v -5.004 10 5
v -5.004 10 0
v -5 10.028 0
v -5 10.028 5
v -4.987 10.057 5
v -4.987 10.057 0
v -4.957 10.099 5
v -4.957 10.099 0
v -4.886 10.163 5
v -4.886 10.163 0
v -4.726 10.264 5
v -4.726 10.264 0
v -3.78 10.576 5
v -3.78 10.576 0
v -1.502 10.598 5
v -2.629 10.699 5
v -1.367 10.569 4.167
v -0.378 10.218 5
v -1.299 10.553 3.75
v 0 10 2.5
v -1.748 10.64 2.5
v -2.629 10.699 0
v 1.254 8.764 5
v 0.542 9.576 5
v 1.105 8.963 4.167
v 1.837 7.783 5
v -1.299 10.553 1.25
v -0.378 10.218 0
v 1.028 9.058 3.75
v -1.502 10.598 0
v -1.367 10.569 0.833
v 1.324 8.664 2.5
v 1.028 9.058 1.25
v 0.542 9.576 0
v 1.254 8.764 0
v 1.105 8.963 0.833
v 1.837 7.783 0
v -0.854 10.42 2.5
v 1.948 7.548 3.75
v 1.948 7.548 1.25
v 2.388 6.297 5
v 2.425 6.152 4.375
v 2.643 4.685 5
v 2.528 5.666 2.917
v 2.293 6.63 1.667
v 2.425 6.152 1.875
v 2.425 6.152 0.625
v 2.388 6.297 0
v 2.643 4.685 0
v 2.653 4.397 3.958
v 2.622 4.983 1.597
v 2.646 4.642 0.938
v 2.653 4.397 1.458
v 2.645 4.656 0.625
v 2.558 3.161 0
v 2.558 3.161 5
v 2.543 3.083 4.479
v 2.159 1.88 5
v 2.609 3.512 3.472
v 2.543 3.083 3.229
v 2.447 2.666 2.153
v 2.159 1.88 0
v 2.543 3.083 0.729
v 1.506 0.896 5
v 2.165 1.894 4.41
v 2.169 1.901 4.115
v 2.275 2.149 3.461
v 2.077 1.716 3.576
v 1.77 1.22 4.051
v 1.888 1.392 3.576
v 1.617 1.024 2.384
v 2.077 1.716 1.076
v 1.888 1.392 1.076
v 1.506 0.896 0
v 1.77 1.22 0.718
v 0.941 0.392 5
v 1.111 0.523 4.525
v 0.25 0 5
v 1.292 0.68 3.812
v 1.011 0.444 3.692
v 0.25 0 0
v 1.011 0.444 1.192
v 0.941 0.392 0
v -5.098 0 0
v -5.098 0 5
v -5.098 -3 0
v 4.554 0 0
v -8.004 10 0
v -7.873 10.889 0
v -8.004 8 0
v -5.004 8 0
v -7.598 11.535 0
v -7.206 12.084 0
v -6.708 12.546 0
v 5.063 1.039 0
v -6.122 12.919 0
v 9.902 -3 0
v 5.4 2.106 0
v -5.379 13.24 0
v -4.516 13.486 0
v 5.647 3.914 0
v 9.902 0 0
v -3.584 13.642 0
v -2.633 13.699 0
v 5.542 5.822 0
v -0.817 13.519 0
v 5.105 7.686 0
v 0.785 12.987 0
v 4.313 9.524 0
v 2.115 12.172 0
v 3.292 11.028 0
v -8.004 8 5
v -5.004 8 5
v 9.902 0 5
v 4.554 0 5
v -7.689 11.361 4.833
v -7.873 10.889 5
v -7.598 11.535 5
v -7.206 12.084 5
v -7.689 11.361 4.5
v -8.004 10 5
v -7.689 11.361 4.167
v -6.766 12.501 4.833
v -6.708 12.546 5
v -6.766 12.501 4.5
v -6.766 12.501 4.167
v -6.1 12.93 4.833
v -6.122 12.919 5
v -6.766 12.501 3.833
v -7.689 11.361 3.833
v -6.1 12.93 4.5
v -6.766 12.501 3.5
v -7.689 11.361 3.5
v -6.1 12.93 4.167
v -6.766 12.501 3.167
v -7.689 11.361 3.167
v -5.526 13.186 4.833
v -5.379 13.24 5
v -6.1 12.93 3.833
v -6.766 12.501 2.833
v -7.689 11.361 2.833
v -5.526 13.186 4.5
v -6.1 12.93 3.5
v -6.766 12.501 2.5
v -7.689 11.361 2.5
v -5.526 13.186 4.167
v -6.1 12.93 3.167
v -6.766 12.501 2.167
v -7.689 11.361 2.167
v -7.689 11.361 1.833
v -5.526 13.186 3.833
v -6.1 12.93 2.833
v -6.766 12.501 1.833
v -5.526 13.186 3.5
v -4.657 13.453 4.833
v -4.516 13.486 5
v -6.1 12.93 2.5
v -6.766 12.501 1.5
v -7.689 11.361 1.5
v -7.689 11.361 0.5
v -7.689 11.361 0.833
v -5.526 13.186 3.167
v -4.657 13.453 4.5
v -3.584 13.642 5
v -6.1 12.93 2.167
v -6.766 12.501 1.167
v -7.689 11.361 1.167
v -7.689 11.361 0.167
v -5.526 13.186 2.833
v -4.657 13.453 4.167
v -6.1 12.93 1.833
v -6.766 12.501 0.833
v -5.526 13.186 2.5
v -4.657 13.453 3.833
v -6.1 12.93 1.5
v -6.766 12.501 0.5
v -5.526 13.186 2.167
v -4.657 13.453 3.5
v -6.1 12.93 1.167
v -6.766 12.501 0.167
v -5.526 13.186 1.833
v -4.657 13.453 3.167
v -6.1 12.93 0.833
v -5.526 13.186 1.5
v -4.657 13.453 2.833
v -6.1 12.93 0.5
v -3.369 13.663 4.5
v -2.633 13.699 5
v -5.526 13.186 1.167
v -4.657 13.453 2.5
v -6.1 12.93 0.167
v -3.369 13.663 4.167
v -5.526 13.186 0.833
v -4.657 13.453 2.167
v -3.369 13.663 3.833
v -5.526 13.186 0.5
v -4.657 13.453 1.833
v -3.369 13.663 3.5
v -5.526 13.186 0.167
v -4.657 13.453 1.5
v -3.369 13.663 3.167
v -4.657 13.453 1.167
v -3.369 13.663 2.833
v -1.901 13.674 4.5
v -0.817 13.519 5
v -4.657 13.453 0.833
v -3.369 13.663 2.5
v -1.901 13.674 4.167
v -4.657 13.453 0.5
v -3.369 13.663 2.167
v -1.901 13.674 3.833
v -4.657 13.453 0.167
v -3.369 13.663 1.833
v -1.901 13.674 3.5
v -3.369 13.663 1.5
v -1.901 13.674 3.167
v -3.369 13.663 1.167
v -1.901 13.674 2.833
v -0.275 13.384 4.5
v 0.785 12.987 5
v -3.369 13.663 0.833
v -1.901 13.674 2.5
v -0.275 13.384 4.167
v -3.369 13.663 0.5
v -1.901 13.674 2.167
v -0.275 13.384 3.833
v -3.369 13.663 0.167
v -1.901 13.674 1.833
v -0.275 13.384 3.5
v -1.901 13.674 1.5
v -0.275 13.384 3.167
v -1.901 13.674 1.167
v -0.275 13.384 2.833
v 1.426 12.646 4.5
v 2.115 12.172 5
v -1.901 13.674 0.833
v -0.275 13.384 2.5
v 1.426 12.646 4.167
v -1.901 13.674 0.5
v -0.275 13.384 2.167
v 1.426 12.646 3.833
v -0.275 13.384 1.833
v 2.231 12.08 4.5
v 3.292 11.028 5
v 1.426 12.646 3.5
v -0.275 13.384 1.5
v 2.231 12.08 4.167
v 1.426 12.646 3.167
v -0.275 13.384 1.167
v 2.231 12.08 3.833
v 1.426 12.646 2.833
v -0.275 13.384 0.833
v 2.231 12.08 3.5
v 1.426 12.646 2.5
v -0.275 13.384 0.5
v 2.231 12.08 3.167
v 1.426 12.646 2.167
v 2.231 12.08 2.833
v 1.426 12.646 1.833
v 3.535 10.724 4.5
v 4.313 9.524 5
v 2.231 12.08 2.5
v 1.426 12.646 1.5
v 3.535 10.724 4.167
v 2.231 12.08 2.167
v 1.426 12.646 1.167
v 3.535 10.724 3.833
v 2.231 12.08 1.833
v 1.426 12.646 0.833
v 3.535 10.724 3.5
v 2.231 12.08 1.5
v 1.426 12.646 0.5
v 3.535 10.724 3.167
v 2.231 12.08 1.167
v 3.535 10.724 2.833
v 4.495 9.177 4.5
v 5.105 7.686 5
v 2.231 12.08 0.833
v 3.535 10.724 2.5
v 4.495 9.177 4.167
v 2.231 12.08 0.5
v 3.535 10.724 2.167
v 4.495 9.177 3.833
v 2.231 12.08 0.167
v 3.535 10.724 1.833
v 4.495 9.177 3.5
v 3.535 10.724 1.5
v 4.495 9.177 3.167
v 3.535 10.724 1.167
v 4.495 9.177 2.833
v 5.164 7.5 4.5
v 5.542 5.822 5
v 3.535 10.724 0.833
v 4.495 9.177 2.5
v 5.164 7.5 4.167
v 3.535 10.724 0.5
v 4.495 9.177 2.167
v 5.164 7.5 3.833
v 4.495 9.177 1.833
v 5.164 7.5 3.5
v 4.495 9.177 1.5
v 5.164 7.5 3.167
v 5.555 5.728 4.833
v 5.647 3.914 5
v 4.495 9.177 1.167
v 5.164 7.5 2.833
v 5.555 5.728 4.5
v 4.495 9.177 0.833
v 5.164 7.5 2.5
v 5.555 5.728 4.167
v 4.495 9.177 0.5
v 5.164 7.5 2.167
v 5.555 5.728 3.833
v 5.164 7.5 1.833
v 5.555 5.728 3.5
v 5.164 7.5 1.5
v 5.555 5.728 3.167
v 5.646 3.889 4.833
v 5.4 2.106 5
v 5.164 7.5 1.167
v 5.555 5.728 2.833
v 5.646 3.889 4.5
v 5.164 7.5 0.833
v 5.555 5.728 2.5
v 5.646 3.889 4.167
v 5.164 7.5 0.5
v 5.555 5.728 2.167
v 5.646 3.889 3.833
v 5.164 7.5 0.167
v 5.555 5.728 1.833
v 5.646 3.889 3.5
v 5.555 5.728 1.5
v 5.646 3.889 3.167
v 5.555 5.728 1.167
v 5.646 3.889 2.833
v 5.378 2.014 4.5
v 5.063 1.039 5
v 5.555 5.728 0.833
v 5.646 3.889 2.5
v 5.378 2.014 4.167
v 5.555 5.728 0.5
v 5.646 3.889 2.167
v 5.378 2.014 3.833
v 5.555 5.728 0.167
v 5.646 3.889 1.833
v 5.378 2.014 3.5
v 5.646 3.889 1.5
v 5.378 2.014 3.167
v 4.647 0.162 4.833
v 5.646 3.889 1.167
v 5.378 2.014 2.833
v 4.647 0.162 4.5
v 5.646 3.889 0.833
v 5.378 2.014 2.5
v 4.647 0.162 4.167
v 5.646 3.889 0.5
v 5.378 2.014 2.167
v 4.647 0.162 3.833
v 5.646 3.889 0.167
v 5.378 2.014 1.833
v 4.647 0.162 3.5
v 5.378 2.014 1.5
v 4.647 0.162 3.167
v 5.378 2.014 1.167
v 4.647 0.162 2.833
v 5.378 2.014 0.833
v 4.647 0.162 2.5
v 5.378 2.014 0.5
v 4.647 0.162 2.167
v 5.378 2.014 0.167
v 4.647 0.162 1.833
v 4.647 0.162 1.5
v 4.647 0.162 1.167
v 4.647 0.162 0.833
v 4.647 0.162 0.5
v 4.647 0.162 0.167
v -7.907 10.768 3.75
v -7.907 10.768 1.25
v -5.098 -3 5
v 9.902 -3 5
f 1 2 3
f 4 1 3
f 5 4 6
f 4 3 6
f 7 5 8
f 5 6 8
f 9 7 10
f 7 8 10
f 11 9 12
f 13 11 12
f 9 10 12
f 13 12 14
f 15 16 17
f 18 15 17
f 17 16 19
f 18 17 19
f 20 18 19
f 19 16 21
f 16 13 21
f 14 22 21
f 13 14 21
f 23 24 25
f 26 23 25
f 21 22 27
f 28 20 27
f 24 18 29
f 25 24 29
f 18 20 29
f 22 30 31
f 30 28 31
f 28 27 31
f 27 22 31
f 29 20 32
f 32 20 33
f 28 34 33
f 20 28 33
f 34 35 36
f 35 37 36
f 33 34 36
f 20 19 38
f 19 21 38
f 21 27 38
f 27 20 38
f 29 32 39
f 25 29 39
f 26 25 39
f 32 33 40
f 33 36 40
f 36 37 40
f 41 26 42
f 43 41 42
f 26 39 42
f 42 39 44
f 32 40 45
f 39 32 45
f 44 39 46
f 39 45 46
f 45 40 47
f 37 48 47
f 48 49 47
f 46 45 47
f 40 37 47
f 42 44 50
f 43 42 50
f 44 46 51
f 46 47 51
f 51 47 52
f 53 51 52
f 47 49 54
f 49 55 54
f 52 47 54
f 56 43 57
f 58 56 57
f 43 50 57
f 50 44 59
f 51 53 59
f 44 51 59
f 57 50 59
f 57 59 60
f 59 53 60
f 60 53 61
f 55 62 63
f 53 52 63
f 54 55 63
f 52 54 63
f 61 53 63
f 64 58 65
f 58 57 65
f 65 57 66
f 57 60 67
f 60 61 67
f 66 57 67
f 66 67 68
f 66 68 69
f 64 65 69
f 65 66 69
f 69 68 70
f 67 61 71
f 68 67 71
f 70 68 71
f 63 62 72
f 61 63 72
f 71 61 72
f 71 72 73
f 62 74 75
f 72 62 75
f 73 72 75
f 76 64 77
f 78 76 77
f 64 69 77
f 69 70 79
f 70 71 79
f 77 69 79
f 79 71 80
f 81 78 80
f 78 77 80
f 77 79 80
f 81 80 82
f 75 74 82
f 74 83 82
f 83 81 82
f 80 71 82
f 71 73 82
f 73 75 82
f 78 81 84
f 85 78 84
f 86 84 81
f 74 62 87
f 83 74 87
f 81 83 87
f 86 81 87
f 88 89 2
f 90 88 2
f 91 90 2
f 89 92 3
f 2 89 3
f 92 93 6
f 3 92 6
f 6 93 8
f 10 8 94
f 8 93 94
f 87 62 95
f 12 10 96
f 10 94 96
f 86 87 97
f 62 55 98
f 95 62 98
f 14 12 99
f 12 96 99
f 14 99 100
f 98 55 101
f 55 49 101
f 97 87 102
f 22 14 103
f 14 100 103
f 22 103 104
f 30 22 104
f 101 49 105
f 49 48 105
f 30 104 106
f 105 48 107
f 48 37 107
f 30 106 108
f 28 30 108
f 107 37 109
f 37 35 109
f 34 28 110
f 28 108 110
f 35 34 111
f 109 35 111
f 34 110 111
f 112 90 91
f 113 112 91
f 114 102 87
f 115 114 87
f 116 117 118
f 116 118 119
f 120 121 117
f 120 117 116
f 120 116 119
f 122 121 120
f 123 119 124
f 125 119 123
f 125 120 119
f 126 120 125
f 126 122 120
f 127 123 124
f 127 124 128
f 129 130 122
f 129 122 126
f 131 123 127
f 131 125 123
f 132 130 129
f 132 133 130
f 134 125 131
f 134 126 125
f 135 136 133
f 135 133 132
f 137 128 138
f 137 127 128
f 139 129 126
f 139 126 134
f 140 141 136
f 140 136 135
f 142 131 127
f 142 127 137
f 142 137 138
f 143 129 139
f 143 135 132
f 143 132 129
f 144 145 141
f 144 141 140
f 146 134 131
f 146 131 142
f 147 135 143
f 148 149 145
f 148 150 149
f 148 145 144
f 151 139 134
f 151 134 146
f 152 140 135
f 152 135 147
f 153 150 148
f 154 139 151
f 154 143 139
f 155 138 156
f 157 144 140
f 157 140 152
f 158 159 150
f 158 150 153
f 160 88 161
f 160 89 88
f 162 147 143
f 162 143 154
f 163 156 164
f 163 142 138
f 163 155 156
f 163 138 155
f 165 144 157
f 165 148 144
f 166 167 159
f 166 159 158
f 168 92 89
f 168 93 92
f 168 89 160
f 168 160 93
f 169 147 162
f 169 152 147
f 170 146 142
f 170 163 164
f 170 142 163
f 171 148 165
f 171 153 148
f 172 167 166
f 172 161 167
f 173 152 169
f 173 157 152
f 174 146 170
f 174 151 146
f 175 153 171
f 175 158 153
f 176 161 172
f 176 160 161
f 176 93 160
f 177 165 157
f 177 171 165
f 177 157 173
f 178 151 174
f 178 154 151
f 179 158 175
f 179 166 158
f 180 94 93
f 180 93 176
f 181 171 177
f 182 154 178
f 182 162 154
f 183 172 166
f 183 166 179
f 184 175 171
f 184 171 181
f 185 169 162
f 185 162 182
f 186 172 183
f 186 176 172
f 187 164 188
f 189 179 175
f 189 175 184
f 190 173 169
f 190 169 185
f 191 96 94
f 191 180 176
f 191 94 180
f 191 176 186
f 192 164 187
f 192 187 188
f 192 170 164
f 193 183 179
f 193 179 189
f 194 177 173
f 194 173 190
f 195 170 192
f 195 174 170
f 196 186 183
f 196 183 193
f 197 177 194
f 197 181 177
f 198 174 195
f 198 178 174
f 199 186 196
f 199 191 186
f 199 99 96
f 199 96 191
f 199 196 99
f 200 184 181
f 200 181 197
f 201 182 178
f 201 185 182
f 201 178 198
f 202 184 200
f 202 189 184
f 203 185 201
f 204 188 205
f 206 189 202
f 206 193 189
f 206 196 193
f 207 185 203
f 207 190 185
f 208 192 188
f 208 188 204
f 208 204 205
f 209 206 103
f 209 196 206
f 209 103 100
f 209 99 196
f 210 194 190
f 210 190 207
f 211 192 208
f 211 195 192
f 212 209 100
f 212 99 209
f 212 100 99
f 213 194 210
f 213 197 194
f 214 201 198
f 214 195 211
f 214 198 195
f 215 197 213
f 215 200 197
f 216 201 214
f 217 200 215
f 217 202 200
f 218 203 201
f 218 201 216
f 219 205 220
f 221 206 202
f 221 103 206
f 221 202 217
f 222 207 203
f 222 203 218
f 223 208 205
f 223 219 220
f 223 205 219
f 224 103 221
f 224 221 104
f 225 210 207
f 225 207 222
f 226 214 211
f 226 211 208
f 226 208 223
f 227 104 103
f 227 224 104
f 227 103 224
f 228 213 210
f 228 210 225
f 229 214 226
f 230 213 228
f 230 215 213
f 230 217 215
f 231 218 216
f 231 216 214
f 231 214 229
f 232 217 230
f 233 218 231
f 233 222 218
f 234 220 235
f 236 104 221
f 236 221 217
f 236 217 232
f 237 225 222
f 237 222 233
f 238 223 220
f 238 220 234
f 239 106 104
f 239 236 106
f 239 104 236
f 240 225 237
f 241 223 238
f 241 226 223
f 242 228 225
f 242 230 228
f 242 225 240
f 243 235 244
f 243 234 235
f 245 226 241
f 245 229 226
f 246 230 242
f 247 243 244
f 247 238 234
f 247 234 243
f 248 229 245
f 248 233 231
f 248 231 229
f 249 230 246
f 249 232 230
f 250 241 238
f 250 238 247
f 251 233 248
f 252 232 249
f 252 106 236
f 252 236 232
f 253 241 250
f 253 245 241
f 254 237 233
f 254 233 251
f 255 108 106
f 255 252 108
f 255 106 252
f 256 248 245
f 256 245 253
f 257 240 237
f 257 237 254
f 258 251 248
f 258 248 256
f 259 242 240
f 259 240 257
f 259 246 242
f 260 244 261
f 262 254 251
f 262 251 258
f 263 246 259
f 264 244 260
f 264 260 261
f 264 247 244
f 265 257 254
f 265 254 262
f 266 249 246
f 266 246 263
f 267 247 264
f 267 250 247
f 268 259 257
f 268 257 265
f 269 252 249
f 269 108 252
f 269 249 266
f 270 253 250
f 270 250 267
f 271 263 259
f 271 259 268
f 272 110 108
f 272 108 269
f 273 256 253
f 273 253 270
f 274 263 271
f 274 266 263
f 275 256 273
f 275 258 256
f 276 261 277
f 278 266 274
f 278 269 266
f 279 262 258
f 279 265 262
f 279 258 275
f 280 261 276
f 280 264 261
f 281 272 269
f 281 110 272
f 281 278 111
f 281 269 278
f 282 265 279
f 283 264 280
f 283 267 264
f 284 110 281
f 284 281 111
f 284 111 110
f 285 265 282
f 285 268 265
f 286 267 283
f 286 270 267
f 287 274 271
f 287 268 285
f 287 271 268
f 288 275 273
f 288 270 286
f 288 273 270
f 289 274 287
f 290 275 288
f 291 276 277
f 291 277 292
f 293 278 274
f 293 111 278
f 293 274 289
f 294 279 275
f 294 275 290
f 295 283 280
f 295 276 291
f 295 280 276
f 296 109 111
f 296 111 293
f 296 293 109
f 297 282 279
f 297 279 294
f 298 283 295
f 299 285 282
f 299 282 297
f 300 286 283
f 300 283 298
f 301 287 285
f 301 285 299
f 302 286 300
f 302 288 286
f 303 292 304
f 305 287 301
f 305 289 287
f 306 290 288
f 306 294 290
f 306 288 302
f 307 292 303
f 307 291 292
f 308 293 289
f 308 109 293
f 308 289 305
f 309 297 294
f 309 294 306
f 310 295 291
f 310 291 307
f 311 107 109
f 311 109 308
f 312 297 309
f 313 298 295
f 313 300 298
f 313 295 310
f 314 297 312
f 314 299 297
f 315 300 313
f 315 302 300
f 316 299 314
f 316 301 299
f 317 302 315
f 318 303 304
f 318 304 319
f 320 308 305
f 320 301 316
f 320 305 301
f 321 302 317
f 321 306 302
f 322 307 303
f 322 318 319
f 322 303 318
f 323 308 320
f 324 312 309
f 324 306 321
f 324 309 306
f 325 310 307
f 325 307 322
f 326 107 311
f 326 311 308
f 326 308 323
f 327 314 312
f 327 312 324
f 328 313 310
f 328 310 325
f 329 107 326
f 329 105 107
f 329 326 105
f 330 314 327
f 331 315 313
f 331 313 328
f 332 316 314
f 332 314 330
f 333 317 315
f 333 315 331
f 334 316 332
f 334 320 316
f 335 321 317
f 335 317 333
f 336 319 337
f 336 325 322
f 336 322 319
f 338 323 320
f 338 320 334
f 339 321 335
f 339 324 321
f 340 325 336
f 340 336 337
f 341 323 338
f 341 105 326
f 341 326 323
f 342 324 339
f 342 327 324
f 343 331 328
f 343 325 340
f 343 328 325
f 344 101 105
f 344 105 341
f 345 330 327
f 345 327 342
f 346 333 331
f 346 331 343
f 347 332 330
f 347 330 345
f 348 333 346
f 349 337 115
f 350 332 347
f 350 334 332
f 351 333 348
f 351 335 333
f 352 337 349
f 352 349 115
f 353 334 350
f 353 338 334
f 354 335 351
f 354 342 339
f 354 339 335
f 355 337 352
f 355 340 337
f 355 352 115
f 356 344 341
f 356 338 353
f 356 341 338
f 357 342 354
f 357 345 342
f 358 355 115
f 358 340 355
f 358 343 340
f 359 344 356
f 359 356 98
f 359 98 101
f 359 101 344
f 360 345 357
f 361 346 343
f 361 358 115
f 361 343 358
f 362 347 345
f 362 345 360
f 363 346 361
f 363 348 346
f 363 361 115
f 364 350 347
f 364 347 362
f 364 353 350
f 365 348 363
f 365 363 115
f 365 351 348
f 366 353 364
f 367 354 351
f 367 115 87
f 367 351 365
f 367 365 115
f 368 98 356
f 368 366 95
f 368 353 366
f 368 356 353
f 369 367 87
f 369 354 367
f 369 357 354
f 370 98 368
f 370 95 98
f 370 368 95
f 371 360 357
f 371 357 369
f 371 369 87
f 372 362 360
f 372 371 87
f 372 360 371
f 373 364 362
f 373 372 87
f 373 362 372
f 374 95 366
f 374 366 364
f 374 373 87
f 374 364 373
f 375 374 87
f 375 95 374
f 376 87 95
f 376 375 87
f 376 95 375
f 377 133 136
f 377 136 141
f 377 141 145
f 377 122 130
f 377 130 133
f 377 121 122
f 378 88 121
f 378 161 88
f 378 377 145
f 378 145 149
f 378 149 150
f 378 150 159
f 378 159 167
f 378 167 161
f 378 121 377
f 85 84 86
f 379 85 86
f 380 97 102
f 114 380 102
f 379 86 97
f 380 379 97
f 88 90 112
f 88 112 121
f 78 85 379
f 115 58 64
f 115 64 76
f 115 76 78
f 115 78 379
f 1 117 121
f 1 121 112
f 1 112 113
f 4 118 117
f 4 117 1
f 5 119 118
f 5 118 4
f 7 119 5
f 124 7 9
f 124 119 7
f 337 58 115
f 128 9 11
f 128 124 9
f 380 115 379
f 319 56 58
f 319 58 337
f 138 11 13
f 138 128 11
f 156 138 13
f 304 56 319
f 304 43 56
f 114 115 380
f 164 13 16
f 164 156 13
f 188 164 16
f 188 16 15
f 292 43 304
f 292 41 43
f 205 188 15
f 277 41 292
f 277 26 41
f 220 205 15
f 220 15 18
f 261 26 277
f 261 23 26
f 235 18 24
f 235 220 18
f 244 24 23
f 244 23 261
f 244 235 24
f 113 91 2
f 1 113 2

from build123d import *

# Parameters (mm, degrees)
F0_W     = 3
F0_H     = 2
F1_DEPTH = 5


# Not quite as in the source:
# - ends of sketch curves that miss each other by under 0.0002 mm in the source are joined
# - the dataset's text gives a spline's control points without its knots; the knots are read off the source's solid


with BuildPart() as f1:
    # F0 (on Top) → F1 (new body)
    with BuildSketch(Plane.XY):
        Polygon((0.2503667564, 0), (-5.0978784384, 0), (-5.0978784384, -3), (9.9021215616, -3), (9.9021215616, 0), (4.5538399041, 0), align=None)
        with BuildLine():
            add(Edge.make_bspline(
                [(-5.0038373292, 10), (-5.0038373292, 10.4105466628), (2.1157200772, 12.6615455049), (4.0203314378, 1.6529998477), (0.2503667564, 0)],
                knots=[0, 0, 0, 0, 0.4142686249, 1, 1, 1, 1], degree=3))
            Line((0.2503667564, 0), (4.5538399041, 0))
            add(Edge.make_bspline(
                [(-8.0038373298, 10), (-8.0038373298, 10.2787056237), (-7.9265937296, 10.7996899682), (-7.6932242014, 11.3893049019), (-7.4344399504, 11.8107970085), (-7.1058635967, 12.2133413532), (-6.7538412088, 12.5232161476), (-6.4054617225, 12.7628325838), (-6.0969380756, 12.93621453), (-5.8079542421, 13.0736567268), (-5.5258027553, 13.1889045793), (-5.1488196574, 13.3220823158), (-4.6640252083, 13.4592847565), (-4.0426527359, 13.5858120578), (-3.3762627135, 13.6713518347), (-2.6639349861, 13.7084653959), (-1.9073543006, 13.686135431), (-1.1101715023, 13.5900533961), (-0.2790603331, 13.4026671913), (0.5747150123, 13.1031110257), (1.2876198097, 12.743572644), (1.8463165534, 12.3791285027), (2.3650523455, 11.9843299327), (2.9469957376, 11.4415186656), (3.7495742807, 10.4950924187), (4.5420905535, 9.1980589469), (5.209598751, 7.5151054912), (5.6041511953, 5.7386647539), (5.7043043683, 3.8960335815), (5.4539395397, 2.0134312582), (4.9603909881, 0.7054202789), (4.5856072864, 0.0536222336), (4.5538399041, 0)],
                knots=[0, 0, 0, 0, 0.0078125, 0.015625, 0.0234375, 0.03125, 0.046875, 0.0625, 0.078125, 0.09375, 0.109375, 0.125, 0.15625, 0.1875, 0.21875, 0.25, 0.28125, 0.3125, 0.34375, 0.375, 0.40625, 0.421875, 0.4375, 0.46875, 0.5, 0.5625, 0.625, 0.6875, 0.75, 0.8125, 0.875, 0.8806276917, 0.8806276917, 0.8806276917, 0.8806276917], degree=3))
            Line((-8.0038373298, 10), (-5.0038373292, 10))
        make_face()
        with Locations((-6.5038373292, 9)):
            Rectangle(F0_W, F0_H)
    extrude(amount=F1_DEPTH)


solid = f1.part
